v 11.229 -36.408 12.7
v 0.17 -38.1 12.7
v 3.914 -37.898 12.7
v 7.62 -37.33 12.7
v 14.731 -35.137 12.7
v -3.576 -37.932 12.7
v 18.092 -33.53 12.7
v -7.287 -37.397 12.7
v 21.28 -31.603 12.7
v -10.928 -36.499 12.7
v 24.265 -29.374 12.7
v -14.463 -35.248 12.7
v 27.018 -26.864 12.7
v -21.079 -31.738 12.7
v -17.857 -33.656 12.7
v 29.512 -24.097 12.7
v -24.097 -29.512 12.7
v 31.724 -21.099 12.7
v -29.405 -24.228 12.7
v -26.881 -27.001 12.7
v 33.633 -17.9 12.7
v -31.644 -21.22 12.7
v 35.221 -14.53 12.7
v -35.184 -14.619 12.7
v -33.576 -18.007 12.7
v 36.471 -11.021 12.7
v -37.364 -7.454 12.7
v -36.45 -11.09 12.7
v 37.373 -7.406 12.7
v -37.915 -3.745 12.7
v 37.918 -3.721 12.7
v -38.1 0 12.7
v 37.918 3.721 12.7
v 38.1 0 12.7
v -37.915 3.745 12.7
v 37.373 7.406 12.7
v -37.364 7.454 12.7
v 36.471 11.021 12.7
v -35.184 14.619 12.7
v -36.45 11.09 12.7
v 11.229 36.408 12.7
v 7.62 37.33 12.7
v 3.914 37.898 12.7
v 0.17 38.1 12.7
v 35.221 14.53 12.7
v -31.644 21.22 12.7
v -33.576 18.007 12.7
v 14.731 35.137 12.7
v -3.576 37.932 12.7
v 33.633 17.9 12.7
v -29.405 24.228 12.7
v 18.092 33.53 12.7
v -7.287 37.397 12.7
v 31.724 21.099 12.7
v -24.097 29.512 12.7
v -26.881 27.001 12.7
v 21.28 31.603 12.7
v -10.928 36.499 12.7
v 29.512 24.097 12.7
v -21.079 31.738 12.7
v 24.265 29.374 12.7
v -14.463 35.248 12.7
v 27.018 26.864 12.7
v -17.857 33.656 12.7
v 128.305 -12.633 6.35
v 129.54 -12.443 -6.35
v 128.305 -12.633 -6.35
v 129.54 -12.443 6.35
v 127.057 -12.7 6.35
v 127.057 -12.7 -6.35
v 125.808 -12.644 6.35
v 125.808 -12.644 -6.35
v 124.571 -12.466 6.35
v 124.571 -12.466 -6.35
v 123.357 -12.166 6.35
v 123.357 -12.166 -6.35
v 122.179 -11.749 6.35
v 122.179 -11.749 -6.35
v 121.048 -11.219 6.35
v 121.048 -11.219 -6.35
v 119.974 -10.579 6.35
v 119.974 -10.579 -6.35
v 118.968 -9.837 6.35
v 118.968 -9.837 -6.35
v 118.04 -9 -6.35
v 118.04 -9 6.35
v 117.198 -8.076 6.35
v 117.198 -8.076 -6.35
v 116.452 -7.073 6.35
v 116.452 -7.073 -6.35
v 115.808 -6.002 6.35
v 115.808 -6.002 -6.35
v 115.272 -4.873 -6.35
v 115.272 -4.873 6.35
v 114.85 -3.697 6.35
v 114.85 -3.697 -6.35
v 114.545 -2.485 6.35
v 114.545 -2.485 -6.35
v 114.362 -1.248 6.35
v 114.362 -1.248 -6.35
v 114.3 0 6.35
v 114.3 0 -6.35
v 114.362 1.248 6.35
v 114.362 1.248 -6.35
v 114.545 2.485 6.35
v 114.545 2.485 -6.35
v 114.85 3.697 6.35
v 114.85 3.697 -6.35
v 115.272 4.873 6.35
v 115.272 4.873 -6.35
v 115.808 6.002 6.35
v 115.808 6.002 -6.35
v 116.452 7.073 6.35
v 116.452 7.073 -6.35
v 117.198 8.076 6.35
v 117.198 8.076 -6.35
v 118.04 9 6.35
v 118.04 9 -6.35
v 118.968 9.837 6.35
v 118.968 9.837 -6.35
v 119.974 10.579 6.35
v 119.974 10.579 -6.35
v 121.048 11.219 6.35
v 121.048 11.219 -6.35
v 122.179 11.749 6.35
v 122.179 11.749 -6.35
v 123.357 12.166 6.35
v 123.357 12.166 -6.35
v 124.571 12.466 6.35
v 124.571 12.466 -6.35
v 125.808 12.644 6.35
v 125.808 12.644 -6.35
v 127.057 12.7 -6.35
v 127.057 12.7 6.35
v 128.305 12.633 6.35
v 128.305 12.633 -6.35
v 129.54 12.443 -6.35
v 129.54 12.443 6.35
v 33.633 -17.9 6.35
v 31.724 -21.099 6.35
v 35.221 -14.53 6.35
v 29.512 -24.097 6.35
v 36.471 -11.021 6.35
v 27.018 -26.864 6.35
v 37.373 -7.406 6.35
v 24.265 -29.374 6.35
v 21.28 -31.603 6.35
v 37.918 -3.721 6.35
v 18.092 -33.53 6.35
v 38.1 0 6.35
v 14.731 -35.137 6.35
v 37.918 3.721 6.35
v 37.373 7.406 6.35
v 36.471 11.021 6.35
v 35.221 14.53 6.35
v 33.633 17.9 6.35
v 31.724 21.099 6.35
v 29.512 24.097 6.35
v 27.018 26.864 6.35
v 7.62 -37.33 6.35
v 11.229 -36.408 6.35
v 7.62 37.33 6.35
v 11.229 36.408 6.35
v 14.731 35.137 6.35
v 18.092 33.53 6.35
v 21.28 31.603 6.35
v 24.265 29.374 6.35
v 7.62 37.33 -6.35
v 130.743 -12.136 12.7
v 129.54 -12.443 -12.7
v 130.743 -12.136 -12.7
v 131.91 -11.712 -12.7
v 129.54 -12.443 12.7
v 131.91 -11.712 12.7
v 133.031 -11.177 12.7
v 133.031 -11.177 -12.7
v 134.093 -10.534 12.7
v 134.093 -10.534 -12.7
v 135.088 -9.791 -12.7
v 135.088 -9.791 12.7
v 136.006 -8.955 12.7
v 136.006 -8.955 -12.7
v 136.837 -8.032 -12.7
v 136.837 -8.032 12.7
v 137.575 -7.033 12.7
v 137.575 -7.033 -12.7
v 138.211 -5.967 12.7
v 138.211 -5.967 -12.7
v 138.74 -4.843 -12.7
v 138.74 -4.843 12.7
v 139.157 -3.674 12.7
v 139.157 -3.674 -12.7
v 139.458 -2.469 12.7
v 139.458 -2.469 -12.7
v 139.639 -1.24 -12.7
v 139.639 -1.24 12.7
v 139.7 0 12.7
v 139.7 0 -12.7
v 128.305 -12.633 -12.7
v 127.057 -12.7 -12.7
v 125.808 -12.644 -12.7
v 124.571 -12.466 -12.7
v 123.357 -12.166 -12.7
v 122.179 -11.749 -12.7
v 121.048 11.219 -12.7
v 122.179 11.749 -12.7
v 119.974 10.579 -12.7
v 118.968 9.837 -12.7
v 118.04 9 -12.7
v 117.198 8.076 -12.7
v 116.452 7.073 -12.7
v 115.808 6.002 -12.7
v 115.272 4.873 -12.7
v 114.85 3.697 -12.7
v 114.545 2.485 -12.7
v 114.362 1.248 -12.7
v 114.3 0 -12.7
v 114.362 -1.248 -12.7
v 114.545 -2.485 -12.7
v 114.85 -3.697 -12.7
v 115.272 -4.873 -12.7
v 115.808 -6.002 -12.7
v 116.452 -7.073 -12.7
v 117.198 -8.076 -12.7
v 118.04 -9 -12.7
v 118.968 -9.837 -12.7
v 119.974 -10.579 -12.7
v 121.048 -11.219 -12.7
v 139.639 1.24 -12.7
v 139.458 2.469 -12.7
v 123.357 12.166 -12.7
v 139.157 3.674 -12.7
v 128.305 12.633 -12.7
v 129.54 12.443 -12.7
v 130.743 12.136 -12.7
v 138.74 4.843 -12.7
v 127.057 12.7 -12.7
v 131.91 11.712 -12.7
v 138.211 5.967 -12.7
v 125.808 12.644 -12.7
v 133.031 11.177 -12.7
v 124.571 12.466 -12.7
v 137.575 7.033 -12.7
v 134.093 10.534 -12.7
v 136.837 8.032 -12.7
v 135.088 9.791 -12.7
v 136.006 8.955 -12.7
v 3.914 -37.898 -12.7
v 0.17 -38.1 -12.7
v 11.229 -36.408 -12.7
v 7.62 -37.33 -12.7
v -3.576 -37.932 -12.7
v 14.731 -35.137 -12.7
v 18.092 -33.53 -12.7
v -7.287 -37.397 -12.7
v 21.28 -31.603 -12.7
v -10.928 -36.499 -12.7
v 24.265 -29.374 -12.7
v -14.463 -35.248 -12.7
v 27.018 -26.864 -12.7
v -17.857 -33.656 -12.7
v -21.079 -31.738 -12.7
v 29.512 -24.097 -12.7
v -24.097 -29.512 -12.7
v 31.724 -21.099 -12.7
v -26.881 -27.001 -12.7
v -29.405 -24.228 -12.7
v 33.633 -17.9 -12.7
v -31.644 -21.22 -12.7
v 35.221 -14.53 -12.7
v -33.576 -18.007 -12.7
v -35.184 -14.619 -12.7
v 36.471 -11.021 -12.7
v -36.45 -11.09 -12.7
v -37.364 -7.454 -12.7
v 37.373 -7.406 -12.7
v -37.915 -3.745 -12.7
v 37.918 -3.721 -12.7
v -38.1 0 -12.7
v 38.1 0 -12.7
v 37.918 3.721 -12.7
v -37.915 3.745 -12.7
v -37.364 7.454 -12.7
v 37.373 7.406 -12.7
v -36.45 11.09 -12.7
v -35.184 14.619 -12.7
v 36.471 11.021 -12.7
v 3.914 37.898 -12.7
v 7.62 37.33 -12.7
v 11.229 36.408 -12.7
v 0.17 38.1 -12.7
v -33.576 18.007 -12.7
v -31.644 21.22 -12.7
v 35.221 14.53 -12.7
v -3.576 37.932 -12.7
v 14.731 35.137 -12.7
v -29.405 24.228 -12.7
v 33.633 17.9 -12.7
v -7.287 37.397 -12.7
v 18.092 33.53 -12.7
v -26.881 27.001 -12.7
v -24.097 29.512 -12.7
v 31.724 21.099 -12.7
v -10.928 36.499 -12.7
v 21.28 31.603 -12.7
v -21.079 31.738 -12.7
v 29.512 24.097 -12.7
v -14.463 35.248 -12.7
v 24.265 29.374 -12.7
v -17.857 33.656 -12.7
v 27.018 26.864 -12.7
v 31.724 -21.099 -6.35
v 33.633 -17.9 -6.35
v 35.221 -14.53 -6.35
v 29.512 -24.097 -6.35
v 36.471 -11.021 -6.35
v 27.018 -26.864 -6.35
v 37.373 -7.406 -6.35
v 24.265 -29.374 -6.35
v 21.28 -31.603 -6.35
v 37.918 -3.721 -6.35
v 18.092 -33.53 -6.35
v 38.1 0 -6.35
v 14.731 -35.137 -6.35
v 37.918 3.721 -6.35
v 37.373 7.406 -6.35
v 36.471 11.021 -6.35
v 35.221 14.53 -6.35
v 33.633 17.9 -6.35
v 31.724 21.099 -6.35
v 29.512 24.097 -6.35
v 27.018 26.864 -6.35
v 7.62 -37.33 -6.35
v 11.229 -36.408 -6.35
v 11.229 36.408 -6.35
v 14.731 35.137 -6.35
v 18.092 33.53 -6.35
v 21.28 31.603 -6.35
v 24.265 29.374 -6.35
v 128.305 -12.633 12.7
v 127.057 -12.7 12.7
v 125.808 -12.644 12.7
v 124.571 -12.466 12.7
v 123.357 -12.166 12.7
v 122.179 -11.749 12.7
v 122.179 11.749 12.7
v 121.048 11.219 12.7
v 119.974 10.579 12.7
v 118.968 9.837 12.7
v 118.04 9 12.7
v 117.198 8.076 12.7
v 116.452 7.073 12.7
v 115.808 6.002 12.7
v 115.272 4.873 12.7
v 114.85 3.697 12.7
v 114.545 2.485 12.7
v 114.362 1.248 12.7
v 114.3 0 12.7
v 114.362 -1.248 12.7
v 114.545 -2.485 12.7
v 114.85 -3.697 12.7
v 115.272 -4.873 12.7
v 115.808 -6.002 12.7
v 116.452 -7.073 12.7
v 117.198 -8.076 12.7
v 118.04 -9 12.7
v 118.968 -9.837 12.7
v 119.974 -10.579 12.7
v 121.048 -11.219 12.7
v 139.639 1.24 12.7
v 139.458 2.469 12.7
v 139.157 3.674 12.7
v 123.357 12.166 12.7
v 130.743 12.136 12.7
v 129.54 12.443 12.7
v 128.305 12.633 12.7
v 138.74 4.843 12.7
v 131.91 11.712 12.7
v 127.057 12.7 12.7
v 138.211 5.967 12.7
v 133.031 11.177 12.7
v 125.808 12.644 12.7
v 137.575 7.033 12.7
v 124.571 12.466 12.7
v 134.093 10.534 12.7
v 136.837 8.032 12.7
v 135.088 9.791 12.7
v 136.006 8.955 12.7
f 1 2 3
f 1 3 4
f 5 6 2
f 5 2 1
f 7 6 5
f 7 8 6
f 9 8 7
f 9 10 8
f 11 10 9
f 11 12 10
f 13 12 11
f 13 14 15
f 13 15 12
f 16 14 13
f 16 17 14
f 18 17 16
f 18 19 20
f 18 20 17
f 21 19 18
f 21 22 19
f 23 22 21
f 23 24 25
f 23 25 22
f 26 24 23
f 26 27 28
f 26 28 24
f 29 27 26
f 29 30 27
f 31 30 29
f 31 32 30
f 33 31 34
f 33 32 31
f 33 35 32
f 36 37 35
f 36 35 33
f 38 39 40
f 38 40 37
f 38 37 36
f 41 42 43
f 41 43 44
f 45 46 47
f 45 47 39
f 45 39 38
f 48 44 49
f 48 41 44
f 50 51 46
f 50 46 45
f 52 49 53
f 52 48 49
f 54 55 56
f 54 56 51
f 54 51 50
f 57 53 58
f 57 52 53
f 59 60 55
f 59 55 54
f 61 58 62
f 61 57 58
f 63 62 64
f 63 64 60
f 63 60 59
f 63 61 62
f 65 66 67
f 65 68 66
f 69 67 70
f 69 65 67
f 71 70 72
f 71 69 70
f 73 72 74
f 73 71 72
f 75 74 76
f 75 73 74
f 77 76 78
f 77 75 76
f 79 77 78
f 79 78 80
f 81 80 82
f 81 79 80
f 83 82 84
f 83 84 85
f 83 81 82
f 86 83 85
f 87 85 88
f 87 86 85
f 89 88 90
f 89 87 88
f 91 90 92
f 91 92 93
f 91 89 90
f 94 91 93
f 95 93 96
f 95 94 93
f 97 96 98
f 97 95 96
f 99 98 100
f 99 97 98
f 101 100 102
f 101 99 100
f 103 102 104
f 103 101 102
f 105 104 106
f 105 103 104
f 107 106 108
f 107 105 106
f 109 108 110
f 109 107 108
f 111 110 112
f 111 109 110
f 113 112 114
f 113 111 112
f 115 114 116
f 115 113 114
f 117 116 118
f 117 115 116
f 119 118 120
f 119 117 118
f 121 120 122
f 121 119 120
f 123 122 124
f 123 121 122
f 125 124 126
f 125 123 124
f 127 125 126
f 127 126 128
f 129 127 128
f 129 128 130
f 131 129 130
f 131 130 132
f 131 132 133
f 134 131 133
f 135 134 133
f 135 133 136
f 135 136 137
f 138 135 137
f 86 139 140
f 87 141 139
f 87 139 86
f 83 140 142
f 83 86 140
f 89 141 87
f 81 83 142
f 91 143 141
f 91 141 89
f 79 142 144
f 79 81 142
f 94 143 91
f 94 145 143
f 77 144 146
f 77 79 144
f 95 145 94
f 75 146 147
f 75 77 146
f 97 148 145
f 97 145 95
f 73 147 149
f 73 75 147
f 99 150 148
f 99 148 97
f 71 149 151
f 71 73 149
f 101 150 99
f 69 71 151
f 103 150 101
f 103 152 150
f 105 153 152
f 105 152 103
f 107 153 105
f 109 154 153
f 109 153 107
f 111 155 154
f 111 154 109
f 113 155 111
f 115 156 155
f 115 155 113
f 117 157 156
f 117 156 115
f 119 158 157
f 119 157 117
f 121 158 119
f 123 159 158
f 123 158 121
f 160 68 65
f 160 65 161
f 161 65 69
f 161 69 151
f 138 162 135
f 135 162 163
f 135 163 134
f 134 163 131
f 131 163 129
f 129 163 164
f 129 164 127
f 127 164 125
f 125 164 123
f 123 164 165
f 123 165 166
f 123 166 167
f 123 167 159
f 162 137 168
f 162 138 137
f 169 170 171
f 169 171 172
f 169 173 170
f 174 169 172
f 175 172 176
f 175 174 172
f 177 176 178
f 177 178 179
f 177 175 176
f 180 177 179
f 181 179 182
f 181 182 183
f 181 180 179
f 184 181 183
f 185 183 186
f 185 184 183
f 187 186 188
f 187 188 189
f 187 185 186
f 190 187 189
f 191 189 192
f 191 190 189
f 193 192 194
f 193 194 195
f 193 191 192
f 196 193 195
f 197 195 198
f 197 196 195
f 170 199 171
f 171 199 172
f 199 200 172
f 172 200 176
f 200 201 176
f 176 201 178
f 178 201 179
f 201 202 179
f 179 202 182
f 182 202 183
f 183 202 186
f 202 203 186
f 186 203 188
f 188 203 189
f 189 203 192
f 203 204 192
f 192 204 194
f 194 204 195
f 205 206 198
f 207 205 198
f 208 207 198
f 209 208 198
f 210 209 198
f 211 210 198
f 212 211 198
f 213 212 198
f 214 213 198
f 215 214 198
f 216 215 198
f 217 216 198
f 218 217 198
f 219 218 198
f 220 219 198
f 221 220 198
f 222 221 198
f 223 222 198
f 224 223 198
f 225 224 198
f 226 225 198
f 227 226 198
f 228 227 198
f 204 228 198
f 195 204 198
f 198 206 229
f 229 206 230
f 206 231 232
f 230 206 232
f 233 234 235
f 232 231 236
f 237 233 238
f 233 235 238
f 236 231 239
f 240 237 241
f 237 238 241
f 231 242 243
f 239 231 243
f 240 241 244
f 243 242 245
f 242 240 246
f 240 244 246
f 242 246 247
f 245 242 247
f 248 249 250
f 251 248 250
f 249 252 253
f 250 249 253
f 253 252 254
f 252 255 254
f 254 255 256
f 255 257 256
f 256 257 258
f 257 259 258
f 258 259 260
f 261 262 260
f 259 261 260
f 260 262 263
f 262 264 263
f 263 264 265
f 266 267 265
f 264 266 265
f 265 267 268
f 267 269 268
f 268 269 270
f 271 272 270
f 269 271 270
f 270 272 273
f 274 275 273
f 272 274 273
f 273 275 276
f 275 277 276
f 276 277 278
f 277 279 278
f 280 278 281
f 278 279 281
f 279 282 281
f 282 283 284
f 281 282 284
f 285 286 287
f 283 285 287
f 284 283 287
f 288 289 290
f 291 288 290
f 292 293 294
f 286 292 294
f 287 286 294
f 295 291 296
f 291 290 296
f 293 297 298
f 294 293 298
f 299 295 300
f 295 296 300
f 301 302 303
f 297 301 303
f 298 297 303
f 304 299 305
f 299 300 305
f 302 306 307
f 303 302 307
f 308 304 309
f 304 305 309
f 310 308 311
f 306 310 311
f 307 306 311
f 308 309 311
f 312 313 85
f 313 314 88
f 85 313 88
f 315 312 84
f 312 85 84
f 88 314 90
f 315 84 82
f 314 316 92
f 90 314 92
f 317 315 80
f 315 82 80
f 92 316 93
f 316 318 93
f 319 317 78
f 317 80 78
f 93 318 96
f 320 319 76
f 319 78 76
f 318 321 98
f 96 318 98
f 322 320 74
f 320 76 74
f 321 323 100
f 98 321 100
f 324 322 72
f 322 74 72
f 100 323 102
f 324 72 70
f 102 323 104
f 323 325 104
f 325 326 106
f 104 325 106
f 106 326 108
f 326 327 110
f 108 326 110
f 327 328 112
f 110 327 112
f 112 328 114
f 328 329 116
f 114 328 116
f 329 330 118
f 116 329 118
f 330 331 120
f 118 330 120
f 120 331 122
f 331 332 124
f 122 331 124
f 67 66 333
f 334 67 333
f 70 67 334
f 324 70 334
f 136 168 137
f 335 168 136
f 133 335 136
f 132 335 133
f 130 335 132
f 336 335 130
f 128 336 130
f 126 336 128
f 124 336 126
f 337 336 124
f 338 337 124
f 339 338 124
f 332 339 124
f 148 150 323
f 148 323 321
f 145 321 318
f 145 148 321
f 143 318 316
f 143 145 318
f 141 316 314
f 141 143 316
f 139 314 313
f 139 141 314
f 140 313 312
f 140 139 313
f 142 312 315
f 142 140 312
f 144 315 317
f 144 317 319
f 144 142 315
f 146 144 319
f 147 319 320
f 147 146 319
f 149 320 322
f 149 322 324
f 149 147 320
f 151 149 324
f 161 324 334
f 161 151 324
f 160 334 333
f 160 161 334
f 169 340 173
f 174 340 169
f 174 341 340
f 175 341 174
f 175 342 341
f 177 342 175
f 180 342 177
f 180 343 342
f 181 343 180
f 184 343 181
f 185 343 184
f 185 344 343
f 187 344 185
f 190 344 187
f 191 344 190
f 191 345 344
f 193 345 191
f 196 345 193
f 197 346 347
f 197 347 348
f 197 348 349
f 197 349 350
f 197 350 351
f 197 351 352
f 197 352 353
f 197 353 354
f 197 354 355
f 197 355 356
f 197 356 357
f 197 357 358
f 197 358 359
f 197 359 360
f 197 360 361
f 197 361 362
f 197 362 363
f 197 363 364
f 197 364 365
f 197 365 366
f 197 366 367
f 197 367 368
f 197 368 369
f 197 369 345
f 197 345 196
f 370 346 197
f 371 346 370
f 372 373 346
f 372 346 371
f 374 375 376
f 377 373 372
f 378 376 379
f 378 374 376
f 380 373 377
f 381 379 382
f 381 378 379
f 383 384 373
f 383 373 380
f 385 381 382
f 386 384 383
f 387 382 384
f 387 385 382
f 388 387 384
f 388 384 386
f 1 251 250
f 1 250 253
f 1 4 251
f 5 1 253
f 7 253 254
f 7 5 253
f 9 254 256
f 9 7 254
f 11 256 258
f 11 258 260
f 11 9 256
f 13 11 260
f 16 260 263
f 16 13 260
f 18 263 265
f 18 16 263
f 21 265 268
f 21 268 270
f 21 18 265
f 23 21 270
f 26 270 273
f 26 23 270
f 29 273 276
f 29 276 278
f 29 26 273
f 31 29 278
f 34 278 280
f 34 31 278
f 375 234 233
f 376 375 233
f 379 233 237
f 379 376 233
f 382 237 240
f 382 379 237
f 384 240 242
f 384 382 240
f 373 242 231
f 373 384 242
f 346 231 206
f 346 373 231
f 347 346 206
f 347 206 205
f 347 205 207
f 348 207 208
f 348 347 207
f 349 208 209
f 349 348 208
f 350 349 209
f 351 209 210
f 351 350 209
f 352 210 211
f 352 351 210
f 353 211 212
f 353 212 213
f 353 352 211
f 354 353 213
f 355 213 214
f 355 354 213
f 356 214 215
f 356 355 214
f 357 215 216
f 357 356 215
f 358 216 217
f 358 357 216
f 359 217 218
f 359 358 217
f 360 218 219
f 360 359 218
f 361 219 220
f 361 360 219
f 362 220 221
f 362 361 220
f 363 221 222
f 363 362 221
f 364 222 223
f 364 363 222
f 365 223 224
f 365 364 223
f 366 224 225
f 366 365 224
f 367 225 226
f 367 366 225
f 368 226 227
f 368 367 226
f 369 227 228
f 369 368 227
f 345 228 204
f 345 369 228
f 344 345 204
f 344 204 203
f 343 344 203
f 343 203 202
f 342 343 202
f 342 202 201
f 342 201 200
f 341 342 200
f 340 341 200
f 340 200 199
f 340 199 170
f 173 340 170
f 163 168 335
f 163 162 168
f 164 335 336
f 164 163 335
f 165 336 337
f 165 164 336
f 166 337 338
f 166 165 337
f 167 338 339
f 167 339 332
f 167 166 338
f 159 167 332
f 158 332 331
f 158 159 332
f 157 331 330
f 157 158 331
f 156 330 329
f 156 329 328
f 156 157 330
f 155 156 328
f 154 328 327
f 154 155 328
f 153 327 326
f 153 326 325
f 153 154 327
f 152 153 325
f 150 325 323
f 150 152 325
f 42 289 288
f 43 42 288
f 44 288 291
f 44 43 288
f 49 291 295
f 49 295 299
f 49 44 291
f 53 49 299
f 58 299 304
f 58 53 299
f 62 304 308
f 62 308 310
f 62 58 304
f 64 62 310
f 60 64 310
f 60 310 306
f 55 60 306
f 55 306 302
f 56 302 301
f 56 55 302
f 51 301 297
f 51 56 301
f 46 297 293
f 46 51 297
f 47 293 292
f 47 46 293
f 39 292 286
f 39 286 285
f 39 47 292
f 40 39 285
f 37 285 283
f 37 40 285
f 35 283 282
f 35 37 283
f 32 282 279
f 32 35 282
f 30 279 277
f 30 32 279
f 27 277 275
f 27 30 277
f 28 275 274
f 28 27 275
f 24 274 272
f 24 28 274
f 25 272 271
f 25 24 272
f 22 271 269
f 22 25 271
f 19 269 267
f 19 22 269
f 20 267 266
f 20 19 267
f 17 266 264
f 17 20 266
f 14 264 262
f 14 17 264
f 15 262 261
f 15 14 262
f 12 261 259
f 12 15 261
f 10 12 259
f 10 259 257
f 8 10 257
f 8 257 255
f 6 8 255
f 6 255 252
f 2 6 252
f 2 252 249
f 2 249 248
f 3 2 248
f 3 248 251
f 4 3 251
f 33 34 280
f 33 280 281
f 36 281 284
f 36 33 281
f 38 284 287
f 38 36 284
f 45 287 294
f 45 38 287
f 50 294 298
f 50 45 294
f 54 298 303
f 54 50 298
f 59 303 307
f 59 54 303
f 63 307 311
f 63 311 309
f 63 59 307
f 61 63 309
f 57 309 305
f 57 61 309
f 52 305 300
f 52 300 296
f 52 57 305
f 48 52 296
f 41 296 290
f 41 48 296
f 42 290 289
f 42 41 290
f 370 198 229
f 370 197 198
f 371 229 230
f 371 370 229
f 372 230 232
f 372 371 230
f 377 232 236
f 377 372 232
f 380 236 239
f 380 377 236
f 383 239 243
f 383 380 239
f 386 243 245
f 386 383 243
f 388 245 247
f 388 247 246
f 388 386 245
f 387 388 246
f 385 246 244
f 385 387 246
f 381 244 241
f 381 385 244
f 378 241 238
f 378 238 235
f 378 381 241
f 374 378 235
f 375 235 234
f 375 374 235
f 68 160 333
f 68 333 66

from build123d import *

# Parameters (mm, degrees)
F1_DEPTH = 12.7
F2_DEPTH = 12.7
F3_DEPTH = 6.35


with BuildPart() as f1:
    # F0 (on Top) → F1 (new body, symmetric)
    with BuildSketch(Plane.XY):
        with BuildLine():
            ThreePointArc((7.62, -37.330224), (29.512133, -24.096556), (38.1, 0))
            ThreePointArc((38.1, 0), (29.512133, 24.096556), (7.62, 37.330224))
            ThreePointArc((7.62, 37.330224), (-38.1, 0), (7.62, -37.330224))
        make_face()
    extrude(amount=F1_DEPTH, both=True)


with BuildPart() as f2:
    # F0 (on Top) → F2 (new body, symmetric)
    with BuildSketch(Plane.XY):
        with BuildLine():
            ThreePointArc((139.7, 0), (136.837378, 8.032185), (129.54, 12.443408))
            ThreePointArc((129.54, 12.443408), (114.3, 0), (129.54, -12.443408))
            ThreePointArc((129.54, -12.443408), (136.837378, -8.032185), (139.7, 0))
        make_face()
    extrude(amount=F2_DEPTH, both=True)


with BuildPart() as f3:
    # F0 (on Top) → F3 (new body, symmetric)
    with BuildSketch(Plane.XY):
        with BuildLine():
            ThreePointArc((7.62, 37.330224), (29.512133, 24.096556), (38.1, 0))
            ThreePointArc((38.1, 0), (29.512133, -24.096556), (7.62, -37.330224))
            Line((7.62, -37.330224), (129.54, -12.443408))
            ThreePointArc((129.54, -12.443408), (114.3, 0), (129.54, 12.443408))
            Line((129.54, 12.443408), (7.62, 37.330224))
        make_face()
    extrude(amount=F3_DEPTH, both=True)


solid = Compound([f1.part, f2.part, f3.part])
